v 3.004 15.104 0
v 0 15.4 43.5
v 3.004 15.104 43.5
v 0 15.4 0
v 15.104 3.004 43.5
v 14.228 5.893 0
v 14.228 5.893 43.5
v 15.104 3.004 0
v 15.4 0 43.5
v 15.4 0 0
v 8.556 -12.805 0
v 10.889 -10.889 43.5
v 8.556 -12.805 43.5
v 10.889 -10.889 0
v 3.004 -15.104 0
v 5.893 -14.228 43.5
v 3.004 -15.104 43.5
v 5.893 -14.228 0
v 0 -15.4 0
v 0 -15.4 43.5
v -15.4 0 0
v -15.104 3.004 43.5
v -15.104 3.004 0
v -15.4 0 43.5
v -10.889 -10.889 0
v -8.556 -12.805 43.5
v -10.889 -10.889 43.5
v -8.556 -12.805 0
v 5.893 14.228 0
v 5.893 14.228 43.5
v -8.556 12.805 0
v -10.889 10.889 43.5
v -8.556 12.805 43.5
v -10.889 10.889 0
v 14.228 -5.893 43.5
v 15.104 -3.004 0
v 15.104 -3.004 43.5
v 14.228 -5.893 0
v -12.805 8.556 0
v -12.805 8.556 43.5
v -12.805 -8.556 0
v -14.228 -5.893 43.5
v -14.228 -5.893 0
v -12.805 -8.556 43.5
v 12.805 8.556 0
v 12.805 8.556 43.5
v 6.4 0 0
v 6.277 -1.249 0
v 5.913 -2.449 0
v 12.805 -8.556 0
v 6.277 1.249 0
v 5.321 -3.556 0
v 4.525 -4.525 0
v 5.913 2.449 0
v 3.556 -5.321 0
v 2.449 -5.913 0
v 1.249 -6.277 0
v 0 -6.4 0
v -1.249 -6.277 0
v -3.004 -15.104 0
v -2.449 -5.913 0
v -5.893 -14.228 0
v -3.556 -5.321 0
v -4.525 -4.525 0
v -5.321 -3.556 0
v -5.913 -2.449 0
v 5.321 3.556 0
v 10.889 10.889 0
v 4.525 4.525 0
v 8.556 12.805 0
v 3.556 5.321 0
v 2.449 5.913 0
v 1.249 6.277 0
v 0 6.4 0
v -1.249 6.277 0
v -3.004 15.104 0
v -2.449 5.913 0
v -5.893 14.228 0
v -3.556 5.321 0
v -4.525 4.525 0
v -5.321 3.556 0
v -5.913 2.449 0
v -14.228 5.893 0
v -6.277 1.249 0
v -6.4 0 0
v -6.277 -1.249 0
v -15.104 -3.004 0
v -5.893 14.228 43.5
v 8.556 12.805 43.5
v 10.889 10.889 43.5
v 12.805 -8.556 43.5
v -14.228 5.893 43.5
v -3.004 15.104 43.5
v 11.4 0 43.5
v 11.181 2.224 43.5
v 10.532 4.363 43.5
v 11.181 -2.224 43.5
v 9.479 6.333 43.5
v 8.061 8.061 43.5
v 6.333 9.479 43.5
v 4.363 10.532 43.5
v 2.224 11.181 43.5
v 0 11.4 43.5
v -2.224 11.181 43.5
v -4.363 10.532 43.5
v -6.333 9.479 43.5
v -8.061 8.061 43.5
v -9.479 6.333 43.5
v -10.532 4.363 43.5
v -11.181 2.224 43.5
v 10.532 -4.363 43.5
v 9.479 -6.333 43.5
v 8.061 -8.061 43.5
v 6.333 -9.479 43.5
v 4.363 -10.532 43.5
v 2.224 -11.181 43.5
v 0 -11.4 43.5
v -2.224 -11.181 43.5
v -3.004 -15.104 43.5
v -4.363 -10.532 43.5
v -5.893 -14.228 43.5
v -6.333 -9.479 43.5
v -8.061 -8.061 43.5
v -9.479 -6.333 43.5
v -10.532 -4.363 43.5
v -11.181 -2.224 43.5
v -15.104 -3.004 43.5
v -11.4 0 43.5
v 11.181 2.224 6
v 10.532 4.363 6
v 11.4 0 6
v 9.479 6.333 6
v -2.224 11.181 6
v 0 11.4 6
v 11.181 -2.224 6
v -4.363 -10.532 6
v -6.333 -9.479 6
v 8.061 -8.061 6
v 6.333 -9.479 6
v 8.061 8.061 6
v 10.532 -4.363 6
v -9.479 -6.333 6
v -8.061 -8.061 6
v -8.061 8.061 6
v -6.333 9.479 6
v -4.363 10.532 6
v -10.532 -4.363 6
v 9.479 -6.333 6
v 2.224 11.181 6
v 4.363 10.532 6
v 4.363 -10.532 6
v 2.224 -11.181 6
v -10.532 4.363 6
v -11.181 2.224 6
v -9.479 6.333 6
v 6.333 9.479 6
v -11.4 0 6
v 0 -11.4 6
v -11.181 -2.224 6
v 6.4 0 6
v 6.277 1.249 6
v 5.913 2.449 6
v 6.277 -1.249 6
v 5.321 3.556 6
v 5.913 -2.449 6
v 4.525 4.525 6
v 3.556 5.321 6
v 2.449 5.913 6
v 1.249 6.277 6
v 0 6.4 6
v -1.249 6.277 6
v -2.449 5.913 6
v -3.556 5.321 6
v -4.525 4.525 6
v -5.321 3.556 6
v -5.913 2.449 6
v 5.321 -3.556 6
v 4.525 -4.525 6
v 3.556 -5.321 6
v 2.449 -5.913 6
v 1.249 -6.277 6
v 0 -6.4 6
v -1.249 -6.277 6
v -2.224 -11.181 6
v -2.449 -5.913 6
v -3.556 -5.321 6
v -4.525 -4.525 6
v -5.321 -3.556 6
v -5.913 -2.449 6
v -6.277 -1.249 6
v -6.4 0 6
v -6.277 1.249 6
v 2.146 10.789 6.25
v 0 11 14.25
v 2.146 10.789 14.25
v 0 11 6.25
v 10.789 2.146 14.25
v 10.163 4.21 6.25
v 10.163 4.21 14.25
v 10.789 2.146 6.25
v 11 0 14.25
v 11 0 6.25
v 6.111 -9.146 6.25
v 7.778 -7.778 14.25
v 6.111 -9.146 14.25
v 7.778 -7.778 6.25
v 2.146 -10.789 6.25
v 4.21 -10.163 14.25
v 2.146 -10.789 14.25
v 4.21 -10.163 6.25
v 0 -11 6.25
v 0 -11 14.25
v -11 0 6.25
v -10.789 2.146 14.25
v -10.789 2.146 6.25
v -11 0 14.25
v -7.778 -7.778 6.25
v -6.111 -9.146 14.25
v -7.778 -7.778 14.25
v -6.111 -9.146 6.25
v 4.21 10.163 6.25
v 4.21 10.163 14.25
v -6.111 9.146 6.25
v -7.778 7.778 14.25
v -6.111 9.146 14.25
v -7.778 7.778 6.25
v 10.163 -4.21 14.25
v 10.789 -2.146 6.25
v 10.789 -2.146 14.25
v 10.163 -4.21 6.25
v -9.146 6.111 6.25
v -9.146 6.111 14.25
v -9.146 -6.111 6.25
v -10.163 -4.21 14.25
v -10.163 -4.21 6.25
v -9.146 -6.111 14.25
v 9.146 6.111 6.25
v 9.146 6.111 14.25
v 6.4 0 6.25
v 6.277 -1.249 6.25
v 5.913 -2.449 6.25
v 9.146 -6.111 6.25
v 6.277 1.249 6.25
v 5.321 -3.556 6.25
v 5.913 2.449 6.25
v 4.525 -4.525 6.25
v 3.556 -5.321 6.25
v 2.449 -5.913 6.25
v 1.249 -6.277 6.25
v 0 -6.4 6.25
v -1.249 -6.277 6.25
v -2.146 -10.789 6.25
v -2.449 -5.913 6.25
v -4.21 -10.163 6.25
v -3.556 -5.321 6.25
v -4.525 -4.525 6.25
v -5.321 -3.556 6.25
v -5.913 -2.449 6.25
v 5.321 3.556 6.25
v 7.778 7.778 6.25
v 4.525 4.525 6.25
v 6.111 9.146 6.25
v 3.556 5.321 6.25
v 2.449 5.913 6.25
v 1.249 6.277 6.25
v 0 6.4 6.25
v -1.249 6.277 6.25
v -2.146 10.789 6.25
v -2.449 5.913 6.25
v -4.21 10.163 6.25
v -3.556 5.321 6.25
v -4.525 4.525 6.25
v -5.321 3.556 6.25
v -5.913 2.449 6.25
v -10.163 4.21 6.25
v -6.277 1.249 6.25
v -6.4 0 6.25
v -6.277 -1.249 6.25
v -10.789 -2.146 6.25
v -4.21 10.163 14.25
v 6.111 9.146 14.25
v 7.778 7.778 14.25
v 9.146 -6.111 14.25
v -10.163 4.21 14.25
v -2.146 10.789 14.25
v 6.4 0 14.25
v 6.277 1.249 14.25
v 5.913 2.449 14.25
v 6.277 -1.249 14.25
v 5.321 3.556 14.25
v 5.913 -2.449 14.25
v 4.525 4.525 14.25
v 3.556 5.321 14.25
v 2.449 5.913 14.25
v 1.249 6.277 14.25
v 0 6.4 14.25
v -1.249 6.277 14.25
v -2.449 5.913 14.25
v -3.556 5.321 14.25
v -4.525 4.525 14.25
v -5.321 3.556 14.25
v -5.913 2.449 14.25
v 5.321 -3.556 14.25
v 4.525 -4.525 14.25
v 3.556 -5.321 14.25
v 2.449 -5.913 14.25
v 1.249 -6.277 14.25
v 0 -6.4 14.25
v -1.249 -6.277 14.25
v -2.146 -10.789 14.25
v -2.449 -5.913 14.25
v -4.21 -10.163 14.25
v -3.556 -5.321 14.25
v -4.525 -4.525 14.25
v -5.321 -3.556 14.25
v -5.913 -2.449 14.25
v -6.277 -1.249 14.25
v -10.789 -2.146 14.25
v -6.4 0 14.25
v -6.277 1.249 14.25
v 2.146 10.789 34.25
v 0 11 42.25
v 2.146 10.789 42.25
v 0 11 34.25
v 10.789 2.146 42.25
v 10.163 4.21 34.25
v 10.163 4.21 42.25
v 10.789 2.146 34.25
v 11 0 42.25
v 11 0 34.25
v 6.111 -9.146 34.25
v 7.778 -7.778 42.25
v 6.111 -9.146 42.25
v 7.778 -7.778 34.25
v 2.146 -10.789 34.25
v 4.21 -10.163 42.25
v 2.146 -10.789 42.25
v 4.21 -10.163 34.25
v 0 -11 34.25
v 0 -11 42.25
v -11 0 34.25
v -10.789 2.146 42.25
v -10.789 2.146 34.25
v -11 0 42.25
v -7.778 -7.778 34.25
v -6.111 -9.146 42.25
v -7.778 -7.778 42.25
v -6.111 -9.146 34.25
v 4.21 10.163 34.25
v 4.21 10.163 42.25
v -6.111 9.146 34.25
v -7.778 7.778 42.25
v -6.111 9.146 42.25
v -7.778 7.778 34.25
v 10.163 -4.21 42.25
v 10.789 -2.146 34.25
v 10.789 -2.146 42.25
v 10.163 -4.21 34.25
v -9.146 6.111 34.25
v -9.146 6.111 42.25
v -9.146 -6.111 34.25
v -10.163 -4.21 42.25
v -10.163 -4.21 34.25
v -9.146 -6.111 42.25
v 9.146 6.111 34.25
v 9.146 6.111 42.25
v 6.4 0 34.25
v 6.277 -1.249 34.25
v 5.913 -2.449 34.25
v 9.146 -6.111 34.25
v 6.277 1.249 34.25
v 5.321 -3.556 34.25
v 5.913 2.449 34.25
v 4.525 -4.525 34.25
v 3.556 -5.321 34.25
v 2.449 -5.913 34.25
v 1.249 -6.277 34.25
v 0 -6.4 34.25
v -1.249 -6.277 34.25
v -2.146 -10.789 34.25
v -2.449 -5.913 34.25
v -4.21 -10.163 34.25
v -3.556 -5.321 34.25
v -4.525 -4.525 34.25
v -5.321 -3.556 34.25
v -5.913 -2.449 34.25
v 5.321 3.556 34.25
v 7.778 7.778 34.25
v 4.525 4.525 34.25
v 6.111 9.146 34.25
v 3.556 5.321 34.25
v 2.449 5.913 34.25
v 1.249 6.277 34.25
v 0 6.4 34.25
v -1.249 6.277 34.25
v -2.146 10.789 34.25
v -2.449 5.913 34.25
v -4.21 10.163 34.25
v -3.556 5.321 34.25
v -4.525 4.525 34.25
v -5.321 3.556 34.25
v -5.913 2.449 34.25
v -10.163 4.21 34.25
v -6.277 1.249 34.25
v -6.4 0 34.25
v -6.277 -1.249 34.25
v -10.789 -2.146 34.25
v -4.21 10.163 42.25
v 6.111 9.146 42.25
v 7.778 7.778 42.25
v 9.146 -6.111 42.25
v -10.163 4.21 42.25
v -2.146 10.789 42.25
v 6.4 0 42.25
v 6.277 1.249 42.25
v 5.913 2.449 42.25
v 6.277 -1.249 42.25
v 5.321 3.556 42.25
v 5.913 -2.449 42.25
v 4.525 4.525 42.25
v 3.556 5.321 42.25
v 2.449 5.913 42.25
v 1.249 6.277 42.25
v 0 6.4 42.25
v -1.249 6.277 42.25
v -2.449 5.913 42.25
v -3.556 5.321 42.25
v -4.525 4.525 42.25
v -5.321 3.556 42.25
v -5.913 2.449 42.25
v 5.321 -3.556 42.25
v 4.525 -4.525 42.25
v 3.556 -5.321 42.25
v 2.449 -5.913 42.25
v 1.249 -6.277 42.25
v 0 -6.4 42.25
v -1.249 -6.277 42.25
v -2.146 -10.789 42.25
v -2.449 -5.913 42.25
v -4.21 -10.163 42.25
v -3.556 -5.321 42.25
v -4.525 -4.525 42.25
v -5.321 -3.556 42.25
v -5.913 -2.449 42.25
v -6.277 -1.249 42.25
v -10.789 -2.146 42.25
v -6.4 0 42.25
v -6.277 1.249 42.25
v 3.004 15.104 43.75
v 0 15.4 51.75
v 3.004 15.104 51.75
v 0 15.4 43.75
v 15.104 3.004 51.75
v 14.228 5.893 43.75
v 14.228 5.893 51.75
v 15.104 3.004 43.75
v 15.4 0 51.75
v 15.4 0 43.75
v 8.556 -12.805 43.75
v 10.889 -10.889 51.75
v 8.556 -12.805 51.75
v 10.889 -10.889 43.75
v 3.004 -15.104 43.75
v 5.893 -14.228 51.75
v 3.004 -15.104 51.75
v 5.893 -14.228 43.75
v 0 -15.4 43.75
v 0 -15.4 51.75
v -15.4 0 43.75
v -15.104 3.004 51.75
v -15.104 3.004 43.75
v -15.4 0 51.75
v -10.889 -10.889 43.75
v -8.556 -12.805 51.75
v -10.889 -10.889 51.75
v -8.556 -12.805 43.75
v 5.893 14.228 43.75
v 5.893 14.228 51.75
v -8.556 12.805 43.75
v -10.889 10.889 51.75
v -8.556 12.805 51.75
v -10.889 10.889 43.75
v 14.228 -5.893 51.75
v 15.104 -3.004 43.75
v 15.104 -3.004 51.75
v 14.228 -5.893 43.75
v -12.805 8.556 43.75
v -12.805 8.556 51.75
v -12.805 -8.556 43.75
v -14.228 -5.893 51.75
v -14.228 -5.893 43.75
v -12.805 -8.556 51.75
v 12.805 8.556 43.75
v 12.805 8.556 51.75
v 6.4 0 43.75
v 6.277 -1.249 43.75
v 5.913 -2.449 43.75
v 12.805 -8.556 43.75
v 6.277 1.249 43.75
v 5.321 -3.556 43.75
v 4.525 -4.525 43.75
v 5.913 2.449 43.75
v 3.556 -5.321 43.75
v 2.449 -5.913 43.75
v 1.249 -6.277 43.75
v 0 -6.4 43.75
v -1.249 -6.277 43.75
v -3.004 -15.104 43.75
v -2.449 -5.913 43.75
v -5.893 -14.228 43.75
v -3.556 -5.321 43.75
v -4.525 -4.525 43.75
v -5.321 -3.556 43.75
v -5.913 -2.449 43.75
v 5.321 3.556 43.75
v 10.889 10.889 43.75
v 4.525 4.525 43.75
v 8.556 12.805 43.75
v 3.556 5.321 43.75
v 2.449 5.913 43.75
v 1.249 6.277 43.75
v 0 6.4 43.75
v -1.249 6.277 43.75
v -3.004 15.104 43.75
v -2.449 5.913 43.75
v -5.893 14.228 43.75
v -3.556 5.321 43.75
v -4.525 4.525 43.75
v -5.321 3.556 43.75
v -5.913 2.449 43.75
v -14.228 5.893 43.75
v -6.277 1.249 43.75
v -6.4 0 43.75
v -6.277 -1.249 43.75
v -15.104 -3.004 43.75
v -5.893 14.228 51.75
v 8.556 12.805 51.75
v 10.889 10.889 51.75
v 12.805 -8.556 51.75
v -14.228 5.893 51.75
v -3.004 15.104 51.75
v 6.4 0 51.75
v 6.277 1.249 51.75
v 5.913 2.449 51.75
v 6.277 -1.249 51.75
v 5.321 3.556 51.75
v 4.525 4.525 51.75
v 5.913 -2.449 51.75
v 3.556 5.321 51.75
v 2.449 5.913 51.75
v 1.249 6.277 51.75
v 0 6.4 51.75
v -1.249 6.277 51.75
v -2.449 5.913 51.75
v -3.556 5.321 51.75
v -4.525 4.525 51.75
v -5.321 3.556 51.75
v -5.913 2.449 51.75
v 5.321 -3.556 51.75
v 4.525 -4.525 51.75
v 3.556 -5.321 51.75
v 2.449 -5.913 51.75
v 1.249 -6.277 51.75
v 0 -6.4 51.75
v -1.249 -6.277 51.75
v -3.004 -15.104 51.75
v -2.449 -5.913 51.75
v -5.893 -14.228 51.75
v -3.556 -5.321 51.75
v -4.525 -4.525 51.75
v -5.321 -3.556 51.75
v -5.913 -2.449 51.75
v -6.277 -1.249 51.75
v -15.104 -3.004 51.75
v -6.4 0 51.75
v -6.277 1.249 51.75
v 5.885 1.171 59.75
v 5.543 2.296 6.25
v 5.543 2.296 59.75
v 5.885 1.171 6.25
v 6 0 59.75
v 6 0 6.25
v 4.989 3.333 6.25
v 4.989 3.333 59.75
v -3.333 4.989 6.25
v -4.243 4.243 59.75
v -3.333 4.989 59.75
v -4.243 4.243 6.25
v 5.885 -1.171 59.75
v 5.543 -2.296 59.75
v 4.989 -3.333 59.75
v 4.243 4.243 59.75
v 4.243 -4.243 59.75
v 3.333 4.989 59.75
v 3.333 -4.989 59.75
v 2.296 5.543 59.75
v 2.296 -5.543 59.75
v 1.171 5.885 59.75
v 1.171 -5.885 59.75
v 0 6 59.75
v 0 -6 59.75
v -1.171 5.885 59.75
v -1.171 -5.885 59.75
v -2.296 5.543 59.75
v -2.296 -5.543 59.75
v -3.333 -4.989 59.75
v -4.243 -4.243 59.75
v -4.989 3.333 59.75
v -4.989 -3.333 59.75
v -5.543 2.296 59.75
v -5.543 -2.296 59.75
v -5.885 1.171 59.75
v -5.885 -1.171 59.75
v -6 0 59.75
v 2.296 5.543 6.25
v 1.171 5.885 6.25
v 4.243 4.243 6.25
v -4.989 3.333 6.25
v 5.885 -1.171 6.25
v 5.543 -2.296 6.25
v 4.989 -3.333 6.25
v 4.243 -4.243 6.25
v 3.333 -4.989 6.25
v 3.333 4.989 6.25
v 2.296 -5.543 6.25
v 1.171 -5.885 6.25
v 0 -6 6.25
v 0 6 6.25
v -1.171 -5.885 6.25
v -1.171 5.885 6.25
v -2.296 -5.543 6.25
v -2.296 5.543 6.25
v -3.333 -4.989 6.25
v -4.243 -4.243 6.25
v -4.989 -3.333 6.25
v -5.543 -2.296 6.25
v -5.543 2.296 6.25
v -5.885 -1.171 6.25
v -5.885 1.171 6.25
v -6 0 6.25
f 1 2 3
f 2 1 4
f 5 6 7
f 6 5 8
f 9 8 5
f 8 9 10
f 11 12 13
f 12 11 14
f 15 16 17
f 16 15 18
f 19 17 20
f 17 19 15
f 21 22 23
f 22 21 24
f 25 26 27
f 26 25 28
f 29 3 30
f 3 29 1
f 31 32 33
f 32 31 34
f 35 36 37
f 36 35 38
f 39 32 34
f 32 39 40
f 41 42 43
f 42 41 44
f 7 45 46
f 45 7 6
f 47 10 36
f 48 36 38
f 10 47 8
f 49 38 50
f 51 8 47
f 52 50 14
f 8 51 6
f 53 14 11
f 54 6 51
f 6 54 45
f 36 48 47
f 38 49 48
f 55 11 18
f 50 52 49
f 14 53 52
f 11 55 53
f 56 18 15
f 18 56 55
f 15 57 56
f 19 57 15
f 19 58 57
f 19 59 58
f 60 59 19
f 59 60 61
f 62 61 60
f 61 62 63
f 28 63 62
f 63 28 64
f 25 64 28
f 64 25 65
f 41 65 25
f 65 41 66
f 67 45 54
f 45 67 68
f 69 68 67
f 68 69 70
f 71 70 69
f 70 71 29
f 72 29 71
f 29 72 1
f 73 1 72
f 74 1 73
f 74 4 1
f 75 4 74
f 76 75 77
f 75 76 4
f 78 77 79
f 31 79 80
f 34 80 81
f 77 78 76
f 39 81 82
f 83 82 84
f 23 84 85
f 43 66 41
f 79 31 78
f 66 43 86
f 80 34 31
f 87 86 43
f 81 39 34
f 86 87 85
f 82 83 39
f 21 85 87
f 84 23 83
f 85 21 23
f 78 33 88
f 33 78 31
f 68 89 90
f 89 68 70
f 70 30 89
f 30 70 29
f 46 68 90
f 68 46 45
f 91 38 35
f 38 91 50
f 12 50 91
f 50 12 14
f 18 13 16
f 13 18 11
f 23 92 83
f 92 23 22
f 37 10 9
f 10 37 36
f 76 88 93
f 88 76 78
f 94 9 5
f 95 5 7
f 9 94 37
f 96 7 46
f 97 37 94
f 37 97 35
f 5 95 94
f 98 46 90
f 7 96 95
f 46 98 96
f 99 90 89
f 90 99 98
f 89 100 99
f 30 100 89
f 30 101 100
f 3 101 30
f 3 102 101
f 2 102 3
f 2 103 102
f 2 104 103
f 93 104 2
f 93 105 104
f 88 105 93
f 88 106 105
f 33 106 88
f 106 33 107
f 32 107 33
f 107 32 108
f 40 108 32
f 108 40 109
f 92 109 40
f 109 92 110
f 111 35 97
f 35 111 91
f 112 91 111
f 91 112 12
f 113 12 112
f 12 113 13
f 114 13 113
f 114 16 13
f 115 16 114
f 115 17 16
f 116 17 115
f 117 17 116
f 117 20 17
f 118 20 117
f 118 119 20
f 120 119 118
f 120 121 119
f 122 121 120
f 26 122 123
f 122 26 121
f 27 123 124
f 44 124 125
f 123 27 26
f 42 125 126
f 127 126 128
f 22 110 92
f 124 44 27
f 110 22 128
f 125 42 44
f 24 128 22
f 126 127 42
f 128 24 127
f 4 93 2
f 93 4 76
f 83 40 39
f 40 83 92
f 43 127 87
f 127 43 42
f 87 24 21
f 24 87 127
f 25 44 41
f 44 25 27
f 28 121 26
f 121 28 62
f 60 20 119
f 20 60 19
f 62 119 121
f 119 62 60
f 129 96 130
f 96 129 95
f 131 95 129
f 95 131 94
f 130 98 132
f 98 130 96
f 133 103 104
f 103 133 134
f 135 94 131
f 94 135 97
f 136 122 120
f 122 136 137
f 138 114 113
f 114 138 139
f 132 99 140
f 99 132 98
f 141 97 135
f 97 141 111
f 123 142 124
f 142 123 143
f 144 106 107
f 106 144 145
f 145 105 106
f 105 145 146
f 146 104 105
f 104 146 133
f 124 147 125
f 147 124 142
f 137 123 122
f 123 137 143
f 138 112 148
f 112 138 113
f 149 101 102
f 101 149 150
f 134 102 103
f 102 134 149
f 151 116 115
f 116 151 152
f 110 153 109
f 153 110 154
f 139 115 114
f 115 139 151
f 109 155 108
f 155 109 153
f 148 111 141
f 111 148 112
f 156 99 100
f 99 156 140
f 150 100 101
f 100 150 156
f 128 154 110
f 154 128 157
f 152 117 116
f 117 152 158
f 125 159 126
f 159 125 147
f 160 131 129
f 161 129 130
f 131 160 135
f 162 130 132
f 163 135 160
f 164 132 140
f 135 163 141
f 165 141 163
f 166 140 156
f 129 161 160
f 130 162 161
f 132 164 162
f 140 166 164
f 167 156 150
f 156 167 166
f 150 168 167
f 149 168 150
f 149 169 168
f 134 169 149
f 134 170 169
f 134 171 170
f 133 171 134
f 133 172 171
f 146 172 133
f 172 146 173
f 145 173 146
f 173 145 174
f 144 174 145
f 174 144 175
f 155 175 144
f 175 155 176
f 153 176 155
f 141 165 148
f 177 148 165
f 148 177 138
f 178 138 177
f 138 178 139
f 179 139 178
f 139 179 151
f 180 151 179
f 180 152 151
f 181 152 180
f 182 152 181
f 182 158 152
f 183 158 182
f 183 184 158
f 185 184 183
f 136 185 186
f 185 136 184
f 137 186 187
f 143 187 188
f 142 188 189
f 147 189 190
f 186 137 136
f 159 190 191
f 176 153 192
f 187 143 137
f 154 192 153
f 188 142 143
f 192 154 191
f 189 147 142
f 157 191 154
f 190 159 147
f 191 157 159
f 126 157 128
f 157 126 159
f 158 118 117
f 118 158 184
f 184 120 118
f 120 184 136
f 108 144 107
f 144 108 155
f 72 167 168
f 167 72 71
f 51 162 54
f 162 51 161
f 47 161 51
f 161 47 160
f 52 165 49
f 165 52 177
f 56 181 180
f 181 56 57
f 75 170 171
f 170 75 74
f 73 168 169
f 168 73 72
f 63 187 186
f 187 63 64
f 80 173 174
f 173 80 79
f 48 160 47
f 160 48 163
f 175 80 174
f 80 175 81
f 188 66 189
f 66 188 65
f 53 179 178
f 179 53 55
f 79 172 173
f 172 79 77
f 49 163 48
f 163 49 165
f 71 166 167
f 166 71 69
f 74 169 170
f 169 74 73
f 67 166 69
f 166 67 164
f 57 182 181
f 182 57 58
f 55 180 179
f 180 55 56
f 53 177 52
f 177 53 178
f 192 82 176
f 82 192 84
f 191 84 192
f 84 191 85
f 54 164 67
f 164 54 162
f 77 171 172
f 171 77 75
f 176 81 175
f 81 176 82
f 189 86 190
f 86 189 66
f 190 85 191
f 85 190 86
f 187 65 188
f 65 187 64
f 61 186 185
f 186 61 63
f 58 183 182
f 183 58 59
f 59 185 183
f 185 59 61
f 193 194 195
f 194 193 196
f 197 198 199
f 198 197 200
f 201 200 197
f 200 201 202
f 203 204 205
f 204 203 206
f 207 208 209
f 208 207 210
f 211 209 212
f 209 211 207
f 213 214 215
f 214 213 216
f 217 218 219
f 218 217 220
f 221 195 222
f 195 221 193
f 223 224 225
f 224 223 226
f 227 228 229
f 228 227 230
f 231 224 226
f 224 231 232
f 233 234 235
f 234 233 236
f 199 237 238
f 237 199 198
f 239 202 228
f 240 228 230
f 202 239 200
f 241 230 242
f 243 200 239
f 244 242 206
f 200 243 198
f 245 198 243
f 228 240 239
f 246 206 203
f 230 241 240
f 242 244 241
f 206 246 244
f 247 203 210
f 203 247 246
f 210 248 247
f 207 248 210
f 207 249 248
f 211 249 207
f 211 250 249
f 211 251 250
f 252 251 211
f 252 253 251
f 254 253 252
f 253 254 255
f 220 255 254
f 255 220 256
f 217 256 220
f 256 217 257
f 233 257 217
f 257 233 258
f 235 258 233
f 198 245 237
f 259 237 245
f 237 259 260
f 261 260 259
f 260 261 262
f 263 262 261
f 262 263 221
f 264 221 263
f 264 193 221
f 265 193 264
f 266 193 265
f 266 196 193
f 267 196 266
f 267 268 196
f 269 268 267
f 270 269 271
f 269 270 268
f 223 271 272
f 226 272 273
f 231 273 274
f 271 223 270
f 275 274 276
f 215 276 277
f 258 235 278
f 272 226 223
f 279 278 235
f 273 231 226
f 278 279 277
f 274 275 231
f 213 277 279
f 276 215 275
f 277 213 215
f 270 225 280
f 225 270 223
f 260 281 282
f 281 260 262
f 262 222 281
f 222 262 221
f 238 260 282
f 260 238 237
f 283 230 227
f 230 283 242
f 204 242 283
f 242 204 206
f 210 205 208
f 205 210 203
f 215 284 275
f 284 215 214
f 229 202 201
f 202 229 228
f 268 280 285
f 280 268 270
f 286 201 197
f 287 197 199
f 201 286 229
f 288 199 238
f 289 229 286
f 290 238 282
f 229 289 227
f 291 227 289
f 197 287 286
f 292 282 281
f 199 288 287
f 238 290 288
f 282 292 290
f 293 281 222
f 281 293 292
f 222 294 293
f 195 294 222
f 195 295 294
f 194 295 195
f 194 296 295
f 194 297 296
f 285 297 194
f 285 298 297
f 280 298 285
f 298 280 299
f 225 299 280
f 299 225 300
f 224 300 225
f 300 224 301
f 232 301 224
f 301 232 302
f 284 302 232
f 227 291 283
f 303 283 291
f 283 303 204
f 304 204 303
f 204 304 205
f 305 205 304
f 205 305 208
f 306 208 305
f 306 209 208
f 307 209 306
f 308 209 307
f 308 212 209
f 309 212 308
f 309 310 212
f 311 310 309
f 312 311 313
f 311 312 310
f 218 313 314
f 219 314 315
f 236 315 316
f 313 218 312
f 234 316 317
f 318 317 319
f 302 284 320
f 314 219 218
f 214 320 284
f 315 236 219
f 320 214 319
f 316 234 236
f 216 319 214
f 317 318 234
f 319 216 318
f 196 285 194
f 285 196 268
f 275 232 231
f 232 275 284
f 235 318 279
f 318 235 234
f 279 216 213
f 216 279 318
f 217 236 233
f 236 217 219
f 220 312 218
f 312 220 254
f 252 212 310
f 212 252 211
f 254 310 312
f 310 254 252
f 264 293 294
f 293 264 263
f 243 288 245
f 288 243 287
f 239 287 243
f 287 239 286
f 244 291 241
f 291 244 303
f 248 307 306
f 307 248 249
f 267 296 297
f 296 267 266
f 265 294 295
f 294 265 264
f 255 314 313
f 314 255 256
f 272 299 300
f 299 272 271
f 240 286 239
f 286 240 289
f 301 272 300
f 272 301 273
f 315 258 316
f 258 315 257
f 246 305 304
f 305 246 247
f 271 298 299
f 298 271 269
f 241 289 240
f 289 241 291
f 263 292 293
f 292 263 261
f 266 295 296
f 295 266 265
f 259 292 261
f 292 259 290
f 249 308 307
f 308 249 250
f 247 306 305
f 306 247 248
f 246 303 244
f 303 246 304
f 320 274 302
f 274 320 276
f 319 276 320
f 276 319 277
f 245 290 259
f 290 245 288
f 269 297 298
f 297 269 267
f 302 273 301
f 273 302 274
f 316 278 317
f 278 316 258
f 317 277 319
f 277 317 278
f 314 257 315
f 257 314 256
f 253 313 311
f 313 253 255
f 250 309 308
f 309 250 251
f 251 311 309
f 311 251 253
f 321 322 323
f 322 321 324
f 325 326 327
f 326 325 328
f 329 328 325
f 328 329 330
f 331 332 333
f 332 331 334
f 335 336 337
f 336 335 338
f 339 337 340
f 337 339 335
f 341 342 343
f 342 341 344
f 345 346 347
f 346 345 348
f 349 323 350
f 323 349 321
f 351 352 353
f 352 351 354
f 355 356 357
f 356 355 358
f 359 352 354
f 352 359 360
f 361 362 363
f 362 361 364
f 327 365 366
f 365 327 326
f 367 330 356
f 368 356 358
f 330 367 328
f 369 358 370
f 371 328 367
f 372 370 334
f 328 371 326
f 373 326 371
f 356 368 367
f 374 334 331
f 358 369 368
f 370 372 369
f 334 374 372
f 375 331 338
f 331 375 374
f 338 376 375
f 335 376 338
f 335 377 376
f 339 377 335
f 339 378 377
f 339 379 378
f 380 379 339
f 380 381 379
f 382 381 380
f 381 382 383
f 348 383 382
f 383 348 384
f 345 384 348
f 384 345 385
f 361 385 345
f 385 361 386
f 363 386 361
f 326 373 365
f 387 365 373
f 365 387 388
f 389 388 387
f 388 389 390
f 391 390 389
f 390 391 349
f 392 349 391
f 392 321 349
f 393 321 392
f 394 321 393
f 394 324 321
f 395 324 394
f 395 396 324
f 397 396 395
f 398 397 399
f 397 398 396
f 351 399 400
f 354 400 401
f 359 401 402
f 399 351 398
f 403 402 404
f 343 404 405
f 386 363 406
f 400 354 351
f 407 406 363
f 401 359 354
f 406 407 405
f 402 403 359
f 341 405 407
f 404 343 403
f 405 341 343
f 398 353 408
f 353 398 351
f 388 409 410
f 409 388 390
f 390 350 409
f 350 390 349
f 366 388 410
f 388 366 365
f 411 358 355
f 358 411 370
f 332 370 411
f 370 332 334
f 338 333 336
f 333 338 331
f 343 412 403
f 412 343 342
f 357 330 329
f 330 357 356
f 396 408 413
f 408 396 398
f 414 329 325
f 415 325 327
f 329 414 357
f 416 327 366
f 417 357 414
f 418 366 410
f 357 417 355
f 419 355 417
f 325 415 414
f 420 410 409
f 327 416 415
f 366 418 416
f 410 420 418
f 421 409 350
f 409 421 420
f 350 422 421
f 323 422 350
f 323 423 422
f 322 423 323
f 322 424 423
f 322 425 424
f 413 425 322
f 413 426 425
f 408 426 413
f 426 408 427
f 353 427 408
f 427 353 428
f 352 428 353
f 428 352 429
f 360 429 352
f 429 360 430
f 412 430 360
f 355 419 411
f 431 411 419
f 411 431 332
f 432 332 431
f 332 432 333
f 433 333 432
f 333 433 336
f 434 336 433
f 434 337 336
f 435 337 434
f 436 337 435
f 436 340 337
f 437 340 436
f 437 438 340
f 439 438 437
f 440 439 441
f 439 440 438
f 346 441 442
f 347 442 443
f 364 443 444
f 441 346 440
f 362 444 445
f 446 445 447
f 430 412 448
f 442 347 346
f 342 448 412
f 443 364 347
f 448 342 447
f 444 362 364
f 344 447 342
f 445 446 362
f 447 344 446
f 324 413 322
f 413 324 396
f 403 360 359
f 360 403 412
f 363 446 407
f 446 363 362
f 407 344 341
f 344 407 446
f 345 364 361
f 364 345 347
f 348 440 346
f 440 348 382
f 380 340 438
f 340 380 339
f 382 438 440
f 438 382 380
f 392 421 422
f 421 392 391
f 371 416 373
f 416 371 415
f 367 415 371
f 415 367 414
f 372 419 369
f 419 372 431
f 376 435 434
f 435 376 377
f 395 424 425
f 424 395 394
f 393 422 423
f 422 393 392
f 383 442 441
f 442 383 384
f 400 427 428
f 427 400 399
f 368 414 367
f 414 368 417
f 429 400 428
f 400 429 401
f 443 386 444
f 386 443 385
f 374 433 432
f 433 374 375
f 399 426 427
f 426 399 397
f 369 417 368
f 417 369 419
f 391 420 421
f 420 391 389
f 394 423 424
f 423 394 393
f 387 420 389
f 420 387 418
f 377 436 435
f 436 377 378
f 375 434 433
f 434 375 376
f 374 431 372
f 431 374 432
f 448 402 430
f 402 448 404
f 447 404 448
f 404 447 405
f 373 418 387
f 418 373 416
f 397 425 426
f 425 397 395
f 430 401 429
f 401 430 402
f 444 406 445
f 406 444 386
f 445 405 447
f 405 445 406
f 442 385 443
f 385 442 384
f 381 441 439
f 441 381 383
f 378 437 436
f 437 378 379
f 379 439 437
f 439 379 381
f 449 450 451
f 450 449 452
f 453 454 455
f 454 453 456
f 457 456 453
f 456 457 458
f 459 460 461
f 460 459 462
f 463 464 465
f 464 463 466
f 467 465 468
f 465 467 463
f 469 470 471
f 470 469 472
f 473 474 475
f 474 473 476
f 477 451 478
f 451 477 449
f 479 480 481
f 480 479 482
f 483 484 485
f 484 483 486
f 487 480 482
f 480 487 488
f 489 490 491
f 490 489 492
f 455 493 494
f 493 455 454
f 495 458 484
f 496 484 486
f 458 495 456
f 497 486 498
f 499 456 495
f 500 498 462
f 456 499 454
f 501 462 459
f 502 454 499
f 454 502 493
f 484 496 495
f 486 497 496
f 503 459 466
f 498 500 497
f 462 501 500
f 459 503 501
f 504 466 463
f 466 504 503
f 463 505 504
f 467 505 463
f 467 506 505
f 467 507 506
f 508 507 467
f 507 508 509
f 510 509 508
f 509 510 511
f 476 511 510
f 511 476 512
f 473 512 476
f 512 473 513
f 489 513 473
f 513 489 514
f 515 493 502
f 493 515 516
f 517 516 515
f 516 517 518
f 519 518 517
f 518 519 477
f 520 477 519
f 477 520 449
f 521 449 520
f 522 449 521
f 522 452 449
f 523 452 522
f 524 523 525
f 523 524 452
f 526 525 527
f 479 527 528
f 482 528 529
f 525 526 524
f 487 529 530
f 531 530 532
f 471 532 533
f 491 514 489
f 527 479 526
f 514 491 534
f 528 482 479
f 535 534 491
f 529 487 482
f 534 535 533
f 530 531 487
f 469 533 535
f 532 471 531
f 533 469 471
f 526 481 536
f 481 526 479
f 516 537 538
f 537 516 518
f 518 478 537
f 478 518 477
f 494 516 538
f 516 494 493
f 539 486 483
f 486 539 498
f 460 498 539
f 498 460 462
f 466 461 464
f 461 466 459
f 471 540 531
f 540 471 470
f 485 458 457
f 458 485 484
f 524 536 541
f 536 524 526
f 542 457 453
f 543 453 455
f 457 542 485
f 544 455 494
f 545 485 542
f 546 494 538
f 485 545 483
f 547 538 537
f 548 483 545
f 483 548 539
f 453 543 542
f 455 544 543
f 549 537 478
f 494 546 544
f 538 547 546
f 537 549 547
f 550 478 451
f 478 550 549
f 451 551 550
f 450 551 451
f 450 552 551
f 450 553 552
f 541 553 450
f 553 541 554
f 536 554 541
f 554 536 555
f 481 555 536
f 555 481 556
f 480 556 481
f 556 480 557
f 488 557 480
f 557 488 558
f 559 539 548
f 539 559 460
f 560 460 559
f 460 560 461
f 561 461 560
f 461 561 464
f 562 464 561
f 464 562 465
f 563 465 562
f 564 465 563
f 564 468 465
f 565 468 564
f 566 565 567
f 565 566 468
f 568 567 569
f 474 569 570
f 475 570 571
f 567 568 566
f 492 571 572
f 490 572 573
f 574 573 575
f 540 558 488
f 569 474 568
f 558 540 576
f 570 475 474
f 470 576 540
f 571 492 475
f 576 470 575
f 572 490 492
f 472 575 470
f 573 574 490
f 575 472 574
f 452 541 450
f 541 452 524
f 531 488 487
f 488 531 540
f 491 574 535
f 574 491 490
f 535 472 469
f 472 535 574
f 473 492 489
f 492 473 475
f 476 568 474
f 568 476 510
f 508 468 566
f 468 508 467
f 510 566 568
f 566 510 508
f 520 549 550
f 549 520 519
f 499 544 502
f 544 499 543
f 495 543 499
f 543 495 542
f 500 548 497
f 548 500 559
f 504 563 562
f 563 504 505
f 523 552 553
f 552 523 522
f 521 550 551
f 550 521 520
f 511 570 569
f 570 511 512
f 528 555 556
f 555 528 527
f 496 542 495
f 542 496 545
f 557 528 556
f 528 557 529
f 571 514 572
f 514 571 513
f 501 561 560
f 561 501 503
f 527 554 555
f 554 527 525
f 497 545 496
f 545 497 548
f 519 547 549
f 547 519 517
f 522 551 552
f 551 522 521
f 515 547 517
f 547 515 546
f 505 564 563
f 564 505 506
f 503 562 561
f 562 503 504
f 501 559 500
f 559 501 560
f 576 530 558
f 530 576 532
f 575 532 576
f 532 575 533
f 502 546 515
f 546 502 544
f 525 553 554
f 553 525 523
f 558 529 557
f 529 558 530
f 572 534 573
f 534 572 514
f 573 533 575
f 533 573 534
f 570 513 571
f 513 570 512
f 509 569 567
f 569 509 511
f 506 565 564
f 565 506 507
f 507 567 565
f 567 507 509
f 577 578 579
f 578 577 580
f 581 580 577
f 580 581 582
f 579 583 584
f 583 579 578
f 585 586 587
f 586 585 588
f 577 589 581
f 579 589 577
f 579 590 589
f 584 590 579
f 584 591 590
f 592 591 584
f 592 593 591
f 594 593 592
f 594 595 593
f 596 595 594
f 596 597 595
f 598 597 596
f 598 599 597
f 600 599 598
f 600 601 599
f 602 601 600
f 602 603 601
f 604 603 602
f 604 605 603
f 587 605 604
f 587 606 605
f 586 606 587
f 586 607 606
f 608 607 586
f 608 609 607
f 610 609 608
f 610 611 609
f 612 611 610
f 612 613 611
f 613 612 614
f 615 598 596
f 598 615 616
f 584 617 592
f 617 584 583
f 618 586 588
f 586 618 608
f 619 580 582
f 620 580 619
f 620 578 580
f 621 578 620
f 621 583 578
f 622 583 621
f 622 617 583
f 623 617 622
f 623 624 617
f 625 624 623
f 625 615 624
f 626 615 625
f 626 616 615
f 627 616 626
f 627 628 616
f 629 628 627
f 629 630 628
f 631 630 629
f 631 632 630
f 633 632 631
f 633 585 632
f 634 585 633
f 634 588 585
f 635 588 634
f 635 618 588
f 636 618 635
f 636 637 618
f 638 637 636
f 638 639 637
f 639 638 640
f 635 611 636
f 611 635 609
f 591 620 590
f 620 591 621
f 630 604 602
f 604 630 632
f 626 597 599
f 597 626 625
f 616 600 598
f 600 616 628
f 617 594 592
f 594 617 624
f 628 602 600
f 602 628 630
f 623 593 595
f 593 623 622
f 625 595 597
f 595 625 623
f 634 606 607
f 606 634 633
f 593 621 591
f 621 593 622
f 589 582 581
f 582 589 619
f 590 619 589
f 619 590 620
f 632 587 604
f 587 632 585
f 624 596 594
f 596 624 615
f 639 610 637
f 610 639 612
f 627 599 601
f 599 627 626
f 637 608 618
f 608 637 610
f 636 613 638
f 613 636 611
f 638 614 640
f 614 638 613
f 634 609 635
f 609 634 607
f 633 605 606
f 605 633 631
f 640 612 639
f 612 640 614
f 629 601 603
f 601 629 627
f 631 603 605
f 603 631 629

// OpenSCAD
$fn = 32;

// ------------------------------------------------------------------------
// Shaft station: cup d30.8 x 43.5 mm, shaft d12
// Every part is its own module, assembly() places every instance.
// ------------------------------------------------------------------------

// --- part 1 ---
module housing_cup() {
  difference() {
    cylinder(h = 43.5, d = 30.8);
    translate([0, 0, 6]) cylinder(h = 38.5, d = 22.8);
    translate([0, 0, -1]) cylinder(h = 8, d = 12.8);
  }
}

// --- part 2 ---
module bearing_lower() {
  difference() {
      translate([0, 0, 0]) cylinder(h = 8, d = 22);
      translate([0, 0, -1]) cylinder(h = 10, d = 12.8);
    }
}

// --- part 3 ---
module bearing_upper() {
  difference() {
      translate([0, 0, 0]) cylinder(h = 8, d = 22);
      translate([0, 0, -1]) cylinder(h = 10, d = 12.8);
    }
}

// --- part 4 ---
module station_shaft() {
  translate([0, 0, -26.75]) cylinder(h = 53.5, d = 12);
}

// --- part 5 ---
module station_cover() {
  difference() {
    cylinder(h = 8, d = 30.8);
    translate([0, 0, -1]) cylinder(h = 10, d = 12.8);
  }
}

// --- assembly ---
module assembly() {
  color([0.80, 0.24, 0.20]) translate([0, 0, 0]) rotate([0, 0, 0]) housing_cup();
  color([0.20, 0.45, 0.75]) translate([0, 0, 6.25]) rotate([0, 0, 0]) bearing_lower();
  color([0.25, 0.62, 0.32]) translate([0, 0, 34.25]) rotate([0, 0, 0]) bearing_upper();
  color([0.92, 0.70, 0.18]) translate([0, 0, 33]) rotate([0, 0, 0]) station_shaft();
  color([0.58, 0.35, 0.70]) translate([0, 0, 43.75]) rotate([0, 0, 0]) station_cover();
}

assembly();
